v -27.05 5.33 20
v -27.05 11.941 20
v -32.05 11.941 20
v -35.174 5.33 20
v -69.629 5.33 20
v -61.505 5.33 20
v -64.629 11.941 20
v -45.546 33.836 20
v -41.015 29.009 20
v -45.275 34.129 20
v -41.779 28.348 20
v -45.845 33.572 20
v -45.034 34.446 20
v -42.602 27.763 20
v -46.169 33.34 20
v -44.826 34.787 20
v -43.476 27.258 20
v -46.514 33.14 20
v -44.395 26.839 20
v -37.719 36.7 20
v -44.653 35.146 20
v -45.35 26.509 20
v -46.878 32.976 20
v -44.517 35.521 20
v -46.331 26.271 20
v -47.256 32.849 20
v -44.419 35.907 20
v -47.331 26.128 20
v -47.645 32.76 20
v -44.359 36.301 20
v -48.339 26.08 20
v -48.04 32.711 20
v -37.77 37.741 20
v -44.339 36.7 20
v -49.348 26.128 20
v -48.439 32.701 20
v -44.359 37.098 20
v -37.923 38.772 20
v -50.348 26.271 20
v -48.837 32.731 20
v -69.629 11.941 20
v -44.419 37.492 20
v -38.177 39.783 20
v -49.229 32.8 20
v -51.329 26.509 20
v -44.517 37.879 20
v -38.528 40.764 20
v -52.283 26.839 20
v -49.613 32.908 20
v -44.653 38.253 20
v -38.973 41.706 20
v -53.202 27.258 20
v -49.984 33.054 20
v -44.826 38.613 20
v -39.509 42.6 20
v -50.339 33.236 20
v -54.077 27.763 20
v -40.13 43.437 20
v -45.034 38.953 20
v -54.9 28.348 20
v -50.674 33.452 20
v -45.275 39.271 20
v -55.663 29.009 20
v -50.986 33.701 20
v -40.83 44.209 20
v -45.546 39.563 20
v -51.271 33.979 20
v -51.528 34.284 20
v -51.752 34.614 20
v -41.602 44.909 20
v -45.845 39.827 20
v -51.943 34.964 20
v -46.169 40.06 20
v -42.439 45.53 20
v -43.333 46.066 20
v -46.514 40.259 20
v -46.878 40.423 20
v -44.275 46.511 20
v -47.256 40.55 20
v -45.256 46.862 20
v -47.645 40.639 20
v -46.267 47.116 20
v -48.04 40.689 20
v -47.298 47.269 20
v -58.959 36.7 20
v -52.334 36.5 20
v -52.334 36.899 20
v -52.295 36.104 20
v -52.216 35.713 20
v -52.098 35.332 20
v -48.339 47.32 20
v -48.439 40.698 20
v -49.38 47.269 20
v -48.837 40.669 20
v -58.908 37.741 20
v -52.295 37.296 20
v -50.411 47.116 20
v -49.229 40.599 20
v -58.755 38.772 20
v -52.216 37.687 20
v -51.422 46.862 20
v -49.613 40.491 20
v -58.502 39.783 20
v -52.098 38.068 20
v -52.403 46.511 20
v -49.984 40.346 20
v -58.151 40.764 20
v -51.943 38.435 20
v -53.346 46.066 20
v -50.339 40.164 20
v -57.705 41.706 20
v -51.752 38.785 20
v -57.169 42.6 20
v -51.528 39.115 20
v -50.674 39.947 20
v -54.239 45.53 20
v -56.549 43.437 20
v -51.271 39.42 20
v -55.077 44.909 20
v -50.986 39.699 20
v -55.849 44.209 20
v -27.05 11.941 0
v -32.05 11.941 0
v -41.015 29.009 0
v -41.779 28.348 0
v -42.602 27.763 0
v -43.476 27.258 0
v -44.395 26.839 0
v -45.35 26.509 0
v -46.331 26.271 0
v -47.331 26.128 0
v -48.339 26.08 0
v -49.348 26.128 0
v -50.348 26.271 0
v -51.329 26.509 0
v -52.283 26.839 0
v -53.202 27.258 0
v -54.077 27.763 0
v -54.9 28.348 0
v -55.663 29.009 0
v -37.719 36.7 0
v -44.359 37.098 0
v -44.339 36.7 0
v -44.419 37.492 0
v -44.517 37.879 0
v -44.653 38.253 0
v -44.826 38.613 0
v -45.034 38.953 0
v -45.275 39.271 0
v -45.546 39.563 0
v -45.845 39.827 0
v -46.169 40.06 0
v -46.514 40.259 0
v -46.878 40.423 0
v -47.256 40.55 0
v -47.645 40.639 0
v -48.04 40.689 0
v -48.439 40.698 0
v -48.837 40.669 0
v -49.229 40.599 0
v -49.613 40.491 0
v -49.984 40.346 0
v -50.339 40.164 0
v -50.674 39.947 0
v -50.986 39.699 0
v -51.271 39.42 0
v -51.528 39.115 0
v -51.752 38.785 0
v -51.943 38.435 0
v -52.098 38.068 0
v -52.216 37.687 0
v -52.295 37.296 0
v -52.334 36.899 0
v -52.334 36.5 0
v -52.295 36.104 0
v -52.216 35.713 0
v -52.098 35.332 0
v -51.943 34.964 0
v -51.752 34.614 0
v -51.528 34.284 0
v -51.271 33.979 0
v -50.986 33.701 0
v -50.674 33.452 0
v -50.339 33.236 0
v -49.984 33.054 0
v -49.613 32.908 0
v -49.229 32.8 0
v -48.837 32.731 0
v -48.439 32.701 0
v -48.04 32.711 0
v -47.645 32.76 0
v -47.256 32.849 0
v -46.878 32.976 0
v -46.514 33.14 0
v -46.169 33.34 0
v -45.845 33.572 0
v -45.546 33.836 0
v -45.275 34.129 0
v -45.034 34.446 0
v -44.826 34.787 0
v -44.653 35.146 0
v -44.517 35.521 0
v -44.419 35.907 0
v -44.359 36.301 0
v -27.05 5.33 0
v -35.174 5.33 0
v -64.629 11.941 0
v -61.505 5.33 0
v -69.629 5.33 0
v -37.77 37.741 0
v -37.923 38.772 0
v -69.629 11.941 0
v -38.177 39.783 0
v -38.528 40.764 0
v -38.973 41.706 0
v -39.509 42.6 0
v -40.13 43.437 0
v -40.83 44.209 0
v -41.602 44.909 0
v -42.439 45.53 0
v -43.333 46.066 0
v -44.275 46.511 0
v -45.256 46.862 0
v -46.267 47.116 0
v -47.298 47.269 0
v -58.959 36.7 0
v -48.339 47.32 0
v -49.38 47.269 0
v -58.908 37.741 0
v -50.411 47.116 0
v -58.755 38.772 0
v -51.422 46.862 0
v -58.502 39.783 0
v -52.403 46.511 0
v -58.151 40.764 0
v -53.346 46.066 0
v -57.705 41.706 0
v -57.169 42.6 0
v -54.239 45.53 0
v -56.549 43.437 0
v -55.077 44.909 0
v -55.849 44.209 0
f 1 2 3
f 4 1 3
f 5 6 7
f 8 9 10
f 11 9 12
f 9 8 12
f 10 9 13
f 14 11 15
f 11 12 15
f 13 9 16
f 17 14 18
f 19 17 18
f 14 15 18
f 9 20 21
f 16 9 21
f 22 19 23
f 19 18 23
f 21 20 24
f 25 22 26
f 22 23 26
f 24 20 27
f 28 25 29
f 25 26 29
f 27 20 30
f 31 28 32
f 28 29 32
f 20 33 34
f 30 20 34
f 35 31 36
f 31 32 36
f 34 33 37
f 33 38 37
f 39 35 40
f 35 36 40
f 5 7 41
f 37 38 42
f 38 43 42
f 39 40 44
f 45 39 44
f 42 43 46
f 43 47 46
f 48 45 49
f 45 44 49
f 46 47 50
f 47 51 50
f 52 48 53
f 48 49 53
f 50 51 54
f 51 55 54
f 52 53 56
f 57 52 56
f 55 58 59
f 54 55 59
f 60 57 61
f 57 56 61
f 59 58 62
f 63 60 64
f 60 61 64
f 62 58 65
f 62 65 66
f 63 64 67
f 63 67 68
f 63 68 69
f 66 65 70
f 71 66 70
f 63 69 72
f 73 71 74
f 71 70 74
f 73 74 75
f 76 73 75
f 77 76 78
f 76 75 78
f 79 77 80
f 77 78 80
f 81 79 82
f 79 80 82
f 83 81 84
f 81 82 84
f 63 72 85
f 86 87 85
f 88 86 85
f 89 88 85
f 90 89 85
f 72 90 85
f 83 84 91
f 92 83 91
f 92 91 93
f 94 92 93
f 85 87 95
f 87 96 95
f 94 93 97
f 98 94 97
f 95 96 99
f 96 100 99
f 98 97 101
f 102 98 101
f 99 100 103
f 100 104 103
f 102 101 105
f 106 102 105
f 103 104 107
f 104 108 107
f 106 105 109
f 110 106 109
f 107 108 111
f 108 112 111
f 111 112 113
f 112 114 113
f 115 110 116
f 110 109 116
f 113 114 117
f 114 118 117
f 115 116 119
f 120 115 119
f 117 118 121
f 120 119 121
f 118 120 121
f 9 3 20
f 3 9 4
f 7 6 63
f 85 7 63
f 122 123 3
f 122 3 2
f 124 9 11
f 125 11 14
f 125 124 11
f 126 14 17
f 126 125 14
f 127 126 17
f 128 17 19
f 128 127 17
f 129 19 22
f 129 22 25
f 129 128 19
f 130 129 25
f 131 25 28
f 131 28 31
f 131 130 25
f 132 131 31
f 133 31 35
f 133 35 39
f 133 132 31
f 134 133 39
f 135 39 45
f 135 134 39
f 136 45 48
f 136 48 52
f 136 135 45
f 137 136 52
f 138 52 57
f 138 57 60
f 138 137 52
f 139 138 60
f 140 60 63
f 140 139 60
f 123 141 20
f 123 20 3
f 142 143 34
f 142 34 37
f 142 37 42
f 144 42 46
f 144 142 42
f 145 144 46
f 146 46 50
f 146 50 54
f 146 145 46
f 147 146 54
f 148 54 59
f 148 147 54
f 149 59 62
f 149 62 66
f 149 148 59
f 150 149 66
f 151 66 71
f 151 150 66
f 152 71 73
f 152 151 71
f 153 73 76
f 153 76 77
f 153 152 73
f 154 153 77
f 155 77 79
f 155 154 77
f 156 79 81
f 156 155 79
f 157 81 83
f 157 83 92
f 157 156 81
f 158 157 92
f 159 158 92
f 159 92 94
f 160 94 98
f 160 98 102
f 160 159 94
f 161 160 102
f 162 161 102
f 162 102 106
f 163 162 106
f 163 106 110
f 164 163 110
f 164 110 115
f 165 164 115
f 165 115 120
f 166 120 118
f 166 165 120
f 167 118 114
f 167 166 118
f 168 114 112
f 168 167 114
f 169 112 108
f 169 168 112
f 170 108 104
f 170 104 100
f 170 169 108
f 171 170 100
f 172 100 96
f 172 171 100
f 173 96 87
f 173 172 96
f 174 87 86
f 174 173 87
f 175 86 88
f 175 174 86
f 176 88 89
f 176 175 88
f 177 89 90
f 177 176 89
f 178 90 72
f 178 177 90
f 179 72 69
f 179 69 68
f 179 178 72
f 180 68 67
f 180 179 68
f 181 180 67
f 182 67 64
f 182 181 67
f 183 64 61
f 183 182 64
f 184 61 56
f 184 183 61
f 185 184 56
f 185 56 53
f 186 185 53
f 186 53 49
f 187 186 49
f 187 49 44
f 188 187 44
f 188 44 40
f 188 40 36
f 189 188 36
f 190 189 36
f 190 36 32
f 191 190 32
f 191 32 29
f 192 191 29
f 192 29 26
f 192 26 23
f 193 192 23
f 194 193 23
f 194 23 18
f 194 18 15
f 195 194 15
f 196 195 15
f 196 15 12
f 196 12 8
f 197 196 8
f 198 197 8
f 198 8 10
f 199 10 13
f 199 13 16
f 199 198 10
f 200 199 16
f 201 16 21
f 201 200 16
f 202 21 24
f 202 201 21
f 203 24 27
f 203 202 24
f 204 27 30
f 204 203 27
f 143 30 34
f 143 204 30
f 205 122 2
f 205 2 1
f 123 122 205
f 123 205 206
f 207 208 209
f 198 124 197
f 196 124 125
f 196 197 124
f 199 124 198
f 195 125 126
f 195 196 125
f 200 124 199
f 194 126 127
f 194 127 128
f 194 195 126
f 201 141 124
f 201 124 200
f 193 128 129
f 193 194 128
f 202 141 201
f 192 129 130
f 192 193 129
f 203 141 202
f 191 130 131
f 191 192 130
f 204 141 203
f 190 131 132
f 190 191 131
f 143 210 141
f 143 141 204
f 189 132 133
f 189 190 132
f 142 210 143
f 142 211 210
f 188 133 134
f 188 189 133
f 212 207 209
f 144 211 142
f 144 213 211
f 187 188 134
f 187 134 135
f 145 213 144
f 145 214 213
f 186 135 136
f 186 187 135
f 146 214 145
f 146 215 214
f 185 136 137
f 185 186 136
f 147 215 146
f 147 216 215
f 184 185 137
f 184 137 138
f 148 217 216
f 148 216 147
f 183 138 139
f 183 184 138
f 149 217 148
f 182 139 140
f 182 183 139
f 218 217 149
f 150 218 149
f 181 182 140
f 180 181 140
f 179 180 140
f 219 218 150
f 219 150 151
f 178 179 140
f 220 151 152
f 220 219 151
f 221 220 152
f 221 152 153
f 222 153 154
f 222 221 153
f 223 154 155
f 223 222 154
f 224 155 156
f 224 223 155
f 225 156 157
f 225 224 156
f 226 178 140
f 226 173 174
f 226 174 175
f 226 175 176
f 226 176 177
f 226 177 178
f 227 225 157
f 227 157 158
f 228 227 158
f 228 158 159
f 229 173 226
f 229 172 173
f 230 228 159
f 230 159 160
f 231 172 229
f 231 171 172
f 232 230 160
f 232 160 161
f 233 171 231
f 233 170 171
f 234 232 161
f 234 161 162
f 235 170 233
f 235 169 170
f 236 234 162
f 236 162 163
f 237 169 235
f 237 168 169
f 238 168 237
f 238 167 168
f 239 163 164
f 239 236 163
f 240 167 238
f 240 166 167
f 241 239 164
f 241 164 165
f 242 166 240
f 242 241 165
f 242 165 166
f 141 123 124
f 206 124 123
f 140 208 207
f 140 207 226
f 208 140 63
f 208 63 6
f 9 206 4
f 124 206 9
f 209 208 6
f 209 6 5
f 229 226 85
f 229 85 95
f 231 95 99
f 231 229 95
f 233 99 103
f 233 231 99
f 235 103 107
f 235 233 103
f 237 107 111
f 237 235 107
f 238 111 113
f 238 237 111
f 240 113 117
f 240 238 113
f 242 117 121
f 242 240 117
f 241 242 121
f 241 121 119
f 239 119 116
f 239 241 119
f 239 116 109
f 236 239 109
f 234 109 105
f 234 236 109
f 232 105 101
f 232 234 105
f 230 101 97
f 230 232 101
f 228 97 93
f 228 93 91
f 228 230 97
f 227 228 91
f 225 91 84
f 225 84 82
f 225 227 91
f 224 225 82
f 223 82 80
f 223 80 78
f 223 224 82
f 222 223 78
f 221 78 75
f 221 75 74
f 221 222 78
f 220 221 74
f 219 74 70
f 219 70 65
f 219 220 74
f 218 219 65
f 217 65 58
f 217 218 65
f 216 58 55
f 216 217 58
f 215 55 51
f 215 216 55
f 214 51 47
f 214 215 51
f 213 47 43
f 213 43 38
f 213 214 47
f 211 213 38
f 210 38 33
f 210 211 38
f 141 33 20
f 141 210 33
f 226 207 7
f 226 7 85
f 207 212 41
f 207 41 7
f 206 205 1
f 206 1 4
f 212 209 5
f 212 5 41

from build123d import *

# Parameters (mm, degrees)
SKETCH_1_R      = 4
EXTRUDE_1_DEPTH = 20


with BuildPart() as part:
    # 草图1 → 凸台-拉伸1 (new body)
    with BuildSketch(Plane.XY):
        with BuildLine():
            Line((-37.719289559, 36.699716541), (-32.049702854, 11.94104698))
            Line((-32.049702854, 11.94104698), (-27.049702854, 11.94104698))
            Line((-27.049702854, 11.94104698), (-27.049702854, 5.329716541))
            Line((-27.049702854, 5.329716541), (-35.173631719, 5.329716541))
            Line((-35.173631719, 5.329716541), (-41.015175762, 29.009348728))
            ThreePointArc((-41.015175762, 29.009348728), (-48.339289559, 26.079716541), (-55.663403355, 29.009348728))
            Line((-55.663403355, 29.009348728), (-61.504947398, 5.329716541))
            Line((-61.504947398, 5.329716541), (-69.628876263, 5.329716541))
            Line((-69.628876263, 5.329716541), (-69.628876263, 11.94104698))
            Line((-69.628876263, 11.94104698), (-64.628876263, 11.94104698))
            Line((-64.628876263, 11.94104698), (-58.959289559, 36.699716541))
            ThreePointArc((-58.959289559, 36.699716541), (-48.339289559, 47.319716541), (-37.719289559, 36.699716541))
        make_face()
        with Locations((-48.339289559, 36.699716541)):
            Circle(SKETCH_1_R, mode=Mode.SUBTRACT)
    extrude(amount=EXTRUDE_1_DEPTH)


solid = part.part
